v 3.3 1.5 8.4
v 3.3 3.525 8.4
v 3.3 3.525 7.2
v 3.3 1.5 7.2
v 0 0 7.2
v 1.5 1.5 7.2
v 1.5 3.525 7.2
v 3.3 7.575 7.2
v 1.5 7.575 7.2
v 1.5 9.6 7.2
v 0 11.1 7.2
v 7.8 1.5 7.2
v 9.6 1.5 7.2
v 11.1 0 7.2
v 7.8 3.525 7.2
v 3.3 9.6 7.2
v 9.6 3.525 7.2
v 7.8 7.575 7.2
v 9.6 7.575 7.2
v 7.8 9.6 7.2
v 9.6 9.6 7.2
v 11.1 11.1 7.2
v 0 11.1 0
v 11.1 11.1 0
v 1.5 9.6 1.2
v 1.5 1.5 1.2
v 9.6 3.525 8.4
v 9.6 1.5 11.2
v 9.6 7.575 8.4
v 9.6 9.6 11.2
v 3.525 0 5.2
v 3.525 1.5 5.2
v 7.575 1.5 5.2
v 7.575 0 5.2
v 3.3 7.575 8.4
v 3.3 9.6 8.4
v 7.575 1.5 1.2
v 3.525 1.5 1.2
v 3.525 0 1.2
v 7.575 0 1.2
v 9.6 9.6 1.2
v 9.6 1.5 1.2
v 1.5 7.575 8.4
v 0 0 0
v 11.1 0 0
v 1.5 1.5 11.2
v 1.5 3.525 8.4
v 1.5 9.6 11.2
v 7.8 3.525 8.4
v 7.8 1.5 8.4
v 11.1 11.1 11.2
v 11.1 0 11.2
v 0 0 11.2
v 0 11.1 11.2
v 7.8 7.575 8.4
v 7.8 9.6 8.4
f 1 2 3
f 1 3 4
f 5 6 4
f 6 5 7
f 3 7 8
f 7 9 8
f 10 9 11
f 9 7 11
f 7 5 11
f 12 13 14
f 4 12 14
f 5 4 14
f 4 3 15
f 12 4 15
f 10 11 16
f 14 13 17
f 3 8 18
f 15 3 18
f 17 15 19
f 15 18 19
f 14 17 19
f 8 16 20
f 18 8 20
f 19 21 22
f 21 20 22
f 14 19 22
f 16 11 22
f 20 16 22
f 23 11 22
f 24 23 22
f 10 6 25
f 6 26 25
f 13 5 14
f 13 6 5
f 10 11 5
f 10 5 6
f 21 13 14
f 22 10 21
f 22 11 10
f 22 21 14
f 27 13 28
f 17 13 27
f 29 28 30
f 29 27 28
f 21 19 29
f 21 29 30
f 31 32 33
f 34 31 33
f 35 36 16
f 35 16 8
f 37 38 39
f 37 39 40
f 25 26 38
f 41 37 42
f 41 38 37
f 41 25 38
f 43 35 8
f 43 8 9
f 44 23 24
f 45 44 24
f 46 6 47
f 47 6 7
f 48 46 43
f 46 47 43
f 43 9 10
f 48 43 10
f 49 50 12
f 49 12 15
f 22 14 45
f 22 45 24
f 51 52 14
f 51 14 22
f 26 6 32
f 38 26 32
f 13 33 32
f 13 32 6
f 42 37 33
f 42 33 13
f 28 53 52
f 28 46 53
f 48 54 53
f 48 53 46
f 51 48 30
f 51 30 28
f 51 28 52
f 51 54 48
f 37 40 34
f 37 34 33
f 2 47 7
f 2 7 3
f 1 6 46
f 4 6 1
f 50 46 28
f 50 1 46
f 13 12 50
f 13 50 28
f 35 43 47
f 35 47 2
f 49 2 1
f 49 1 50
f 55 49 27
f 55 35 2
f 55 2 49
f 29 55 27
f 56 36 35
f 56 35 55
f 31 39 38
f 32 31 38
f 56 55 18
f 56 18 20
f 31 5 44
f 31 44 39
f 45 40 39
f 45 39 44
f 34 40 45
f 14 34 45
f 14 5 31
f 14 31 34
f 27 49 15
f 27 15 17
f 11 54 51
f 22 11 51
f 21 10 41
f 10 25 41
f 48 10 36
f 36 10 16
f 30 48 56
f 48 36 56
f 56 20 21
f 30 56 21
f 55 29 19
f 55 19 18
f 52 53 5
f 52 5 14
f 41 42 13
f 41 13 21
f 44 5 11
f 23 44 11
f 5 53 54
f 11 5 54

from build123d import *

# Parameters (mm, degrees)
SKETCH1_W           = 11.1
SKETCH1_H           = 11.1
BOSS_EXTRUDE1_DEPTH = 1.2
BOSS_EXTRUDE2_START = 1.2
SKETCH1_3_W         = 11.1
SKETCH1_3_H         = 11.1
SKETCH1_3_W_2       = 8.1
SKETCH1_3_H_2       = 8.1
BOSS_EXTRUDE2_DEPTH = 10
BOSS_EXTRUDE3_START = 8.4
SKETCH1_4_W         = 11.1
SKETCH1_4_H         = 11.1
SKETCH1_4_W_2       = 8.1
SKETCH1_4_H_2       = 8.1
BOSS_EXTRUDE3_DEPTH = 1.2
SKETCH2_W           = 4.05
SKETCH2_H           = 1.5
CUT_EXTRUDE1_DEPTH  = 4


# Read off the part's stored shape, not the designer's step: Split2
with BuildPart() as part:
    # Sketch1 → Boss-Extrude1 (new body)
    with BuildSketch(Plane.XY):
        with Locations((5.55, 5.55)):
            Rectangle(SKETCH1_W, SKETCH1_H)
    extrude(amount=BOSS_EXTRUDE1_DEPTH)

    # Sketch1<3> → Boss-Extrude2 (add)
    with BuildSketch(Plane.XY.offset(BOSS_EXTRUDE2_START)):
        with Locations((5.55, 5.55)):
            Rectangle(SKETCH1_3_W, SKETCH1_3_H)
        with Locations((5.55, 5.55)):
            Rectangle(SKETCH1_3_W_2, SKETCH1_3_H_2, mode=Mode.SUBTRACT)
    extrude(amount=BOSS_EXTRUDE2_DEPTH)

    # Sketch1<4> → Boss-Extrude3 (add)
    # profile 1 of 2: a face of its own
    with BuildSketch(Plane.XY.offset(BOSS_EXTRUDE3_START)):
        with Locations((5.55, 5.55)):
            Rectangle(SKETCH1_4_W, SKETCH1_4_H)
        with Locations((5.55, 5.55)):
            Rectangle(SKETCH1_4_W_2, SKETCH1_4_H_2, mode=Mode.SUBTRACT)
    # profile 2 of 2: a face of its own
    with BuildSketch(Plane.XY.offset(BOSS_EXTRUDE3_START)):
        Polygon((3.3, 3.525), (3.3, 1.5), (7.8, 1.5), (7.8, 3.525), (9.6, 3.525), (9.6, 7.575), (7.8, 7.575), (7.8, 9.6), (3.3, 9.6), (3.3, 7.575), (1.5, 7.575), (1.5, 3.525), align=None)
    extrude(amount=-BOSS_EXTRUDE3_DEPTH)


with BuildPart() as body_2:
    # Split2: the piece on the far side of the plane
    add(part.part)
    split(bisect_by=Plane.XY.offset(7.2), keep=Keep.BOTTOM)

    # Sketch2 → Cut-Extrude1 (cut)
    with BuildSketch(Plane.XY.offset(1.2)):
        with Locations((5.55, 0.75)):
            Rectangle(SKETCH2_W, SKETCH2_H)
    extrude(amount=CUT_EXTRUDE1_DEPTH, mode=Mode.SUBTRACT)


with BuildPart() as part_1:
    add(part.part)

    # Split2
    split(bisect_by=Plane.XY.offset(7.2), keep=Keep.TOP)


solid = Compound([body_2.part, part_1.part])
